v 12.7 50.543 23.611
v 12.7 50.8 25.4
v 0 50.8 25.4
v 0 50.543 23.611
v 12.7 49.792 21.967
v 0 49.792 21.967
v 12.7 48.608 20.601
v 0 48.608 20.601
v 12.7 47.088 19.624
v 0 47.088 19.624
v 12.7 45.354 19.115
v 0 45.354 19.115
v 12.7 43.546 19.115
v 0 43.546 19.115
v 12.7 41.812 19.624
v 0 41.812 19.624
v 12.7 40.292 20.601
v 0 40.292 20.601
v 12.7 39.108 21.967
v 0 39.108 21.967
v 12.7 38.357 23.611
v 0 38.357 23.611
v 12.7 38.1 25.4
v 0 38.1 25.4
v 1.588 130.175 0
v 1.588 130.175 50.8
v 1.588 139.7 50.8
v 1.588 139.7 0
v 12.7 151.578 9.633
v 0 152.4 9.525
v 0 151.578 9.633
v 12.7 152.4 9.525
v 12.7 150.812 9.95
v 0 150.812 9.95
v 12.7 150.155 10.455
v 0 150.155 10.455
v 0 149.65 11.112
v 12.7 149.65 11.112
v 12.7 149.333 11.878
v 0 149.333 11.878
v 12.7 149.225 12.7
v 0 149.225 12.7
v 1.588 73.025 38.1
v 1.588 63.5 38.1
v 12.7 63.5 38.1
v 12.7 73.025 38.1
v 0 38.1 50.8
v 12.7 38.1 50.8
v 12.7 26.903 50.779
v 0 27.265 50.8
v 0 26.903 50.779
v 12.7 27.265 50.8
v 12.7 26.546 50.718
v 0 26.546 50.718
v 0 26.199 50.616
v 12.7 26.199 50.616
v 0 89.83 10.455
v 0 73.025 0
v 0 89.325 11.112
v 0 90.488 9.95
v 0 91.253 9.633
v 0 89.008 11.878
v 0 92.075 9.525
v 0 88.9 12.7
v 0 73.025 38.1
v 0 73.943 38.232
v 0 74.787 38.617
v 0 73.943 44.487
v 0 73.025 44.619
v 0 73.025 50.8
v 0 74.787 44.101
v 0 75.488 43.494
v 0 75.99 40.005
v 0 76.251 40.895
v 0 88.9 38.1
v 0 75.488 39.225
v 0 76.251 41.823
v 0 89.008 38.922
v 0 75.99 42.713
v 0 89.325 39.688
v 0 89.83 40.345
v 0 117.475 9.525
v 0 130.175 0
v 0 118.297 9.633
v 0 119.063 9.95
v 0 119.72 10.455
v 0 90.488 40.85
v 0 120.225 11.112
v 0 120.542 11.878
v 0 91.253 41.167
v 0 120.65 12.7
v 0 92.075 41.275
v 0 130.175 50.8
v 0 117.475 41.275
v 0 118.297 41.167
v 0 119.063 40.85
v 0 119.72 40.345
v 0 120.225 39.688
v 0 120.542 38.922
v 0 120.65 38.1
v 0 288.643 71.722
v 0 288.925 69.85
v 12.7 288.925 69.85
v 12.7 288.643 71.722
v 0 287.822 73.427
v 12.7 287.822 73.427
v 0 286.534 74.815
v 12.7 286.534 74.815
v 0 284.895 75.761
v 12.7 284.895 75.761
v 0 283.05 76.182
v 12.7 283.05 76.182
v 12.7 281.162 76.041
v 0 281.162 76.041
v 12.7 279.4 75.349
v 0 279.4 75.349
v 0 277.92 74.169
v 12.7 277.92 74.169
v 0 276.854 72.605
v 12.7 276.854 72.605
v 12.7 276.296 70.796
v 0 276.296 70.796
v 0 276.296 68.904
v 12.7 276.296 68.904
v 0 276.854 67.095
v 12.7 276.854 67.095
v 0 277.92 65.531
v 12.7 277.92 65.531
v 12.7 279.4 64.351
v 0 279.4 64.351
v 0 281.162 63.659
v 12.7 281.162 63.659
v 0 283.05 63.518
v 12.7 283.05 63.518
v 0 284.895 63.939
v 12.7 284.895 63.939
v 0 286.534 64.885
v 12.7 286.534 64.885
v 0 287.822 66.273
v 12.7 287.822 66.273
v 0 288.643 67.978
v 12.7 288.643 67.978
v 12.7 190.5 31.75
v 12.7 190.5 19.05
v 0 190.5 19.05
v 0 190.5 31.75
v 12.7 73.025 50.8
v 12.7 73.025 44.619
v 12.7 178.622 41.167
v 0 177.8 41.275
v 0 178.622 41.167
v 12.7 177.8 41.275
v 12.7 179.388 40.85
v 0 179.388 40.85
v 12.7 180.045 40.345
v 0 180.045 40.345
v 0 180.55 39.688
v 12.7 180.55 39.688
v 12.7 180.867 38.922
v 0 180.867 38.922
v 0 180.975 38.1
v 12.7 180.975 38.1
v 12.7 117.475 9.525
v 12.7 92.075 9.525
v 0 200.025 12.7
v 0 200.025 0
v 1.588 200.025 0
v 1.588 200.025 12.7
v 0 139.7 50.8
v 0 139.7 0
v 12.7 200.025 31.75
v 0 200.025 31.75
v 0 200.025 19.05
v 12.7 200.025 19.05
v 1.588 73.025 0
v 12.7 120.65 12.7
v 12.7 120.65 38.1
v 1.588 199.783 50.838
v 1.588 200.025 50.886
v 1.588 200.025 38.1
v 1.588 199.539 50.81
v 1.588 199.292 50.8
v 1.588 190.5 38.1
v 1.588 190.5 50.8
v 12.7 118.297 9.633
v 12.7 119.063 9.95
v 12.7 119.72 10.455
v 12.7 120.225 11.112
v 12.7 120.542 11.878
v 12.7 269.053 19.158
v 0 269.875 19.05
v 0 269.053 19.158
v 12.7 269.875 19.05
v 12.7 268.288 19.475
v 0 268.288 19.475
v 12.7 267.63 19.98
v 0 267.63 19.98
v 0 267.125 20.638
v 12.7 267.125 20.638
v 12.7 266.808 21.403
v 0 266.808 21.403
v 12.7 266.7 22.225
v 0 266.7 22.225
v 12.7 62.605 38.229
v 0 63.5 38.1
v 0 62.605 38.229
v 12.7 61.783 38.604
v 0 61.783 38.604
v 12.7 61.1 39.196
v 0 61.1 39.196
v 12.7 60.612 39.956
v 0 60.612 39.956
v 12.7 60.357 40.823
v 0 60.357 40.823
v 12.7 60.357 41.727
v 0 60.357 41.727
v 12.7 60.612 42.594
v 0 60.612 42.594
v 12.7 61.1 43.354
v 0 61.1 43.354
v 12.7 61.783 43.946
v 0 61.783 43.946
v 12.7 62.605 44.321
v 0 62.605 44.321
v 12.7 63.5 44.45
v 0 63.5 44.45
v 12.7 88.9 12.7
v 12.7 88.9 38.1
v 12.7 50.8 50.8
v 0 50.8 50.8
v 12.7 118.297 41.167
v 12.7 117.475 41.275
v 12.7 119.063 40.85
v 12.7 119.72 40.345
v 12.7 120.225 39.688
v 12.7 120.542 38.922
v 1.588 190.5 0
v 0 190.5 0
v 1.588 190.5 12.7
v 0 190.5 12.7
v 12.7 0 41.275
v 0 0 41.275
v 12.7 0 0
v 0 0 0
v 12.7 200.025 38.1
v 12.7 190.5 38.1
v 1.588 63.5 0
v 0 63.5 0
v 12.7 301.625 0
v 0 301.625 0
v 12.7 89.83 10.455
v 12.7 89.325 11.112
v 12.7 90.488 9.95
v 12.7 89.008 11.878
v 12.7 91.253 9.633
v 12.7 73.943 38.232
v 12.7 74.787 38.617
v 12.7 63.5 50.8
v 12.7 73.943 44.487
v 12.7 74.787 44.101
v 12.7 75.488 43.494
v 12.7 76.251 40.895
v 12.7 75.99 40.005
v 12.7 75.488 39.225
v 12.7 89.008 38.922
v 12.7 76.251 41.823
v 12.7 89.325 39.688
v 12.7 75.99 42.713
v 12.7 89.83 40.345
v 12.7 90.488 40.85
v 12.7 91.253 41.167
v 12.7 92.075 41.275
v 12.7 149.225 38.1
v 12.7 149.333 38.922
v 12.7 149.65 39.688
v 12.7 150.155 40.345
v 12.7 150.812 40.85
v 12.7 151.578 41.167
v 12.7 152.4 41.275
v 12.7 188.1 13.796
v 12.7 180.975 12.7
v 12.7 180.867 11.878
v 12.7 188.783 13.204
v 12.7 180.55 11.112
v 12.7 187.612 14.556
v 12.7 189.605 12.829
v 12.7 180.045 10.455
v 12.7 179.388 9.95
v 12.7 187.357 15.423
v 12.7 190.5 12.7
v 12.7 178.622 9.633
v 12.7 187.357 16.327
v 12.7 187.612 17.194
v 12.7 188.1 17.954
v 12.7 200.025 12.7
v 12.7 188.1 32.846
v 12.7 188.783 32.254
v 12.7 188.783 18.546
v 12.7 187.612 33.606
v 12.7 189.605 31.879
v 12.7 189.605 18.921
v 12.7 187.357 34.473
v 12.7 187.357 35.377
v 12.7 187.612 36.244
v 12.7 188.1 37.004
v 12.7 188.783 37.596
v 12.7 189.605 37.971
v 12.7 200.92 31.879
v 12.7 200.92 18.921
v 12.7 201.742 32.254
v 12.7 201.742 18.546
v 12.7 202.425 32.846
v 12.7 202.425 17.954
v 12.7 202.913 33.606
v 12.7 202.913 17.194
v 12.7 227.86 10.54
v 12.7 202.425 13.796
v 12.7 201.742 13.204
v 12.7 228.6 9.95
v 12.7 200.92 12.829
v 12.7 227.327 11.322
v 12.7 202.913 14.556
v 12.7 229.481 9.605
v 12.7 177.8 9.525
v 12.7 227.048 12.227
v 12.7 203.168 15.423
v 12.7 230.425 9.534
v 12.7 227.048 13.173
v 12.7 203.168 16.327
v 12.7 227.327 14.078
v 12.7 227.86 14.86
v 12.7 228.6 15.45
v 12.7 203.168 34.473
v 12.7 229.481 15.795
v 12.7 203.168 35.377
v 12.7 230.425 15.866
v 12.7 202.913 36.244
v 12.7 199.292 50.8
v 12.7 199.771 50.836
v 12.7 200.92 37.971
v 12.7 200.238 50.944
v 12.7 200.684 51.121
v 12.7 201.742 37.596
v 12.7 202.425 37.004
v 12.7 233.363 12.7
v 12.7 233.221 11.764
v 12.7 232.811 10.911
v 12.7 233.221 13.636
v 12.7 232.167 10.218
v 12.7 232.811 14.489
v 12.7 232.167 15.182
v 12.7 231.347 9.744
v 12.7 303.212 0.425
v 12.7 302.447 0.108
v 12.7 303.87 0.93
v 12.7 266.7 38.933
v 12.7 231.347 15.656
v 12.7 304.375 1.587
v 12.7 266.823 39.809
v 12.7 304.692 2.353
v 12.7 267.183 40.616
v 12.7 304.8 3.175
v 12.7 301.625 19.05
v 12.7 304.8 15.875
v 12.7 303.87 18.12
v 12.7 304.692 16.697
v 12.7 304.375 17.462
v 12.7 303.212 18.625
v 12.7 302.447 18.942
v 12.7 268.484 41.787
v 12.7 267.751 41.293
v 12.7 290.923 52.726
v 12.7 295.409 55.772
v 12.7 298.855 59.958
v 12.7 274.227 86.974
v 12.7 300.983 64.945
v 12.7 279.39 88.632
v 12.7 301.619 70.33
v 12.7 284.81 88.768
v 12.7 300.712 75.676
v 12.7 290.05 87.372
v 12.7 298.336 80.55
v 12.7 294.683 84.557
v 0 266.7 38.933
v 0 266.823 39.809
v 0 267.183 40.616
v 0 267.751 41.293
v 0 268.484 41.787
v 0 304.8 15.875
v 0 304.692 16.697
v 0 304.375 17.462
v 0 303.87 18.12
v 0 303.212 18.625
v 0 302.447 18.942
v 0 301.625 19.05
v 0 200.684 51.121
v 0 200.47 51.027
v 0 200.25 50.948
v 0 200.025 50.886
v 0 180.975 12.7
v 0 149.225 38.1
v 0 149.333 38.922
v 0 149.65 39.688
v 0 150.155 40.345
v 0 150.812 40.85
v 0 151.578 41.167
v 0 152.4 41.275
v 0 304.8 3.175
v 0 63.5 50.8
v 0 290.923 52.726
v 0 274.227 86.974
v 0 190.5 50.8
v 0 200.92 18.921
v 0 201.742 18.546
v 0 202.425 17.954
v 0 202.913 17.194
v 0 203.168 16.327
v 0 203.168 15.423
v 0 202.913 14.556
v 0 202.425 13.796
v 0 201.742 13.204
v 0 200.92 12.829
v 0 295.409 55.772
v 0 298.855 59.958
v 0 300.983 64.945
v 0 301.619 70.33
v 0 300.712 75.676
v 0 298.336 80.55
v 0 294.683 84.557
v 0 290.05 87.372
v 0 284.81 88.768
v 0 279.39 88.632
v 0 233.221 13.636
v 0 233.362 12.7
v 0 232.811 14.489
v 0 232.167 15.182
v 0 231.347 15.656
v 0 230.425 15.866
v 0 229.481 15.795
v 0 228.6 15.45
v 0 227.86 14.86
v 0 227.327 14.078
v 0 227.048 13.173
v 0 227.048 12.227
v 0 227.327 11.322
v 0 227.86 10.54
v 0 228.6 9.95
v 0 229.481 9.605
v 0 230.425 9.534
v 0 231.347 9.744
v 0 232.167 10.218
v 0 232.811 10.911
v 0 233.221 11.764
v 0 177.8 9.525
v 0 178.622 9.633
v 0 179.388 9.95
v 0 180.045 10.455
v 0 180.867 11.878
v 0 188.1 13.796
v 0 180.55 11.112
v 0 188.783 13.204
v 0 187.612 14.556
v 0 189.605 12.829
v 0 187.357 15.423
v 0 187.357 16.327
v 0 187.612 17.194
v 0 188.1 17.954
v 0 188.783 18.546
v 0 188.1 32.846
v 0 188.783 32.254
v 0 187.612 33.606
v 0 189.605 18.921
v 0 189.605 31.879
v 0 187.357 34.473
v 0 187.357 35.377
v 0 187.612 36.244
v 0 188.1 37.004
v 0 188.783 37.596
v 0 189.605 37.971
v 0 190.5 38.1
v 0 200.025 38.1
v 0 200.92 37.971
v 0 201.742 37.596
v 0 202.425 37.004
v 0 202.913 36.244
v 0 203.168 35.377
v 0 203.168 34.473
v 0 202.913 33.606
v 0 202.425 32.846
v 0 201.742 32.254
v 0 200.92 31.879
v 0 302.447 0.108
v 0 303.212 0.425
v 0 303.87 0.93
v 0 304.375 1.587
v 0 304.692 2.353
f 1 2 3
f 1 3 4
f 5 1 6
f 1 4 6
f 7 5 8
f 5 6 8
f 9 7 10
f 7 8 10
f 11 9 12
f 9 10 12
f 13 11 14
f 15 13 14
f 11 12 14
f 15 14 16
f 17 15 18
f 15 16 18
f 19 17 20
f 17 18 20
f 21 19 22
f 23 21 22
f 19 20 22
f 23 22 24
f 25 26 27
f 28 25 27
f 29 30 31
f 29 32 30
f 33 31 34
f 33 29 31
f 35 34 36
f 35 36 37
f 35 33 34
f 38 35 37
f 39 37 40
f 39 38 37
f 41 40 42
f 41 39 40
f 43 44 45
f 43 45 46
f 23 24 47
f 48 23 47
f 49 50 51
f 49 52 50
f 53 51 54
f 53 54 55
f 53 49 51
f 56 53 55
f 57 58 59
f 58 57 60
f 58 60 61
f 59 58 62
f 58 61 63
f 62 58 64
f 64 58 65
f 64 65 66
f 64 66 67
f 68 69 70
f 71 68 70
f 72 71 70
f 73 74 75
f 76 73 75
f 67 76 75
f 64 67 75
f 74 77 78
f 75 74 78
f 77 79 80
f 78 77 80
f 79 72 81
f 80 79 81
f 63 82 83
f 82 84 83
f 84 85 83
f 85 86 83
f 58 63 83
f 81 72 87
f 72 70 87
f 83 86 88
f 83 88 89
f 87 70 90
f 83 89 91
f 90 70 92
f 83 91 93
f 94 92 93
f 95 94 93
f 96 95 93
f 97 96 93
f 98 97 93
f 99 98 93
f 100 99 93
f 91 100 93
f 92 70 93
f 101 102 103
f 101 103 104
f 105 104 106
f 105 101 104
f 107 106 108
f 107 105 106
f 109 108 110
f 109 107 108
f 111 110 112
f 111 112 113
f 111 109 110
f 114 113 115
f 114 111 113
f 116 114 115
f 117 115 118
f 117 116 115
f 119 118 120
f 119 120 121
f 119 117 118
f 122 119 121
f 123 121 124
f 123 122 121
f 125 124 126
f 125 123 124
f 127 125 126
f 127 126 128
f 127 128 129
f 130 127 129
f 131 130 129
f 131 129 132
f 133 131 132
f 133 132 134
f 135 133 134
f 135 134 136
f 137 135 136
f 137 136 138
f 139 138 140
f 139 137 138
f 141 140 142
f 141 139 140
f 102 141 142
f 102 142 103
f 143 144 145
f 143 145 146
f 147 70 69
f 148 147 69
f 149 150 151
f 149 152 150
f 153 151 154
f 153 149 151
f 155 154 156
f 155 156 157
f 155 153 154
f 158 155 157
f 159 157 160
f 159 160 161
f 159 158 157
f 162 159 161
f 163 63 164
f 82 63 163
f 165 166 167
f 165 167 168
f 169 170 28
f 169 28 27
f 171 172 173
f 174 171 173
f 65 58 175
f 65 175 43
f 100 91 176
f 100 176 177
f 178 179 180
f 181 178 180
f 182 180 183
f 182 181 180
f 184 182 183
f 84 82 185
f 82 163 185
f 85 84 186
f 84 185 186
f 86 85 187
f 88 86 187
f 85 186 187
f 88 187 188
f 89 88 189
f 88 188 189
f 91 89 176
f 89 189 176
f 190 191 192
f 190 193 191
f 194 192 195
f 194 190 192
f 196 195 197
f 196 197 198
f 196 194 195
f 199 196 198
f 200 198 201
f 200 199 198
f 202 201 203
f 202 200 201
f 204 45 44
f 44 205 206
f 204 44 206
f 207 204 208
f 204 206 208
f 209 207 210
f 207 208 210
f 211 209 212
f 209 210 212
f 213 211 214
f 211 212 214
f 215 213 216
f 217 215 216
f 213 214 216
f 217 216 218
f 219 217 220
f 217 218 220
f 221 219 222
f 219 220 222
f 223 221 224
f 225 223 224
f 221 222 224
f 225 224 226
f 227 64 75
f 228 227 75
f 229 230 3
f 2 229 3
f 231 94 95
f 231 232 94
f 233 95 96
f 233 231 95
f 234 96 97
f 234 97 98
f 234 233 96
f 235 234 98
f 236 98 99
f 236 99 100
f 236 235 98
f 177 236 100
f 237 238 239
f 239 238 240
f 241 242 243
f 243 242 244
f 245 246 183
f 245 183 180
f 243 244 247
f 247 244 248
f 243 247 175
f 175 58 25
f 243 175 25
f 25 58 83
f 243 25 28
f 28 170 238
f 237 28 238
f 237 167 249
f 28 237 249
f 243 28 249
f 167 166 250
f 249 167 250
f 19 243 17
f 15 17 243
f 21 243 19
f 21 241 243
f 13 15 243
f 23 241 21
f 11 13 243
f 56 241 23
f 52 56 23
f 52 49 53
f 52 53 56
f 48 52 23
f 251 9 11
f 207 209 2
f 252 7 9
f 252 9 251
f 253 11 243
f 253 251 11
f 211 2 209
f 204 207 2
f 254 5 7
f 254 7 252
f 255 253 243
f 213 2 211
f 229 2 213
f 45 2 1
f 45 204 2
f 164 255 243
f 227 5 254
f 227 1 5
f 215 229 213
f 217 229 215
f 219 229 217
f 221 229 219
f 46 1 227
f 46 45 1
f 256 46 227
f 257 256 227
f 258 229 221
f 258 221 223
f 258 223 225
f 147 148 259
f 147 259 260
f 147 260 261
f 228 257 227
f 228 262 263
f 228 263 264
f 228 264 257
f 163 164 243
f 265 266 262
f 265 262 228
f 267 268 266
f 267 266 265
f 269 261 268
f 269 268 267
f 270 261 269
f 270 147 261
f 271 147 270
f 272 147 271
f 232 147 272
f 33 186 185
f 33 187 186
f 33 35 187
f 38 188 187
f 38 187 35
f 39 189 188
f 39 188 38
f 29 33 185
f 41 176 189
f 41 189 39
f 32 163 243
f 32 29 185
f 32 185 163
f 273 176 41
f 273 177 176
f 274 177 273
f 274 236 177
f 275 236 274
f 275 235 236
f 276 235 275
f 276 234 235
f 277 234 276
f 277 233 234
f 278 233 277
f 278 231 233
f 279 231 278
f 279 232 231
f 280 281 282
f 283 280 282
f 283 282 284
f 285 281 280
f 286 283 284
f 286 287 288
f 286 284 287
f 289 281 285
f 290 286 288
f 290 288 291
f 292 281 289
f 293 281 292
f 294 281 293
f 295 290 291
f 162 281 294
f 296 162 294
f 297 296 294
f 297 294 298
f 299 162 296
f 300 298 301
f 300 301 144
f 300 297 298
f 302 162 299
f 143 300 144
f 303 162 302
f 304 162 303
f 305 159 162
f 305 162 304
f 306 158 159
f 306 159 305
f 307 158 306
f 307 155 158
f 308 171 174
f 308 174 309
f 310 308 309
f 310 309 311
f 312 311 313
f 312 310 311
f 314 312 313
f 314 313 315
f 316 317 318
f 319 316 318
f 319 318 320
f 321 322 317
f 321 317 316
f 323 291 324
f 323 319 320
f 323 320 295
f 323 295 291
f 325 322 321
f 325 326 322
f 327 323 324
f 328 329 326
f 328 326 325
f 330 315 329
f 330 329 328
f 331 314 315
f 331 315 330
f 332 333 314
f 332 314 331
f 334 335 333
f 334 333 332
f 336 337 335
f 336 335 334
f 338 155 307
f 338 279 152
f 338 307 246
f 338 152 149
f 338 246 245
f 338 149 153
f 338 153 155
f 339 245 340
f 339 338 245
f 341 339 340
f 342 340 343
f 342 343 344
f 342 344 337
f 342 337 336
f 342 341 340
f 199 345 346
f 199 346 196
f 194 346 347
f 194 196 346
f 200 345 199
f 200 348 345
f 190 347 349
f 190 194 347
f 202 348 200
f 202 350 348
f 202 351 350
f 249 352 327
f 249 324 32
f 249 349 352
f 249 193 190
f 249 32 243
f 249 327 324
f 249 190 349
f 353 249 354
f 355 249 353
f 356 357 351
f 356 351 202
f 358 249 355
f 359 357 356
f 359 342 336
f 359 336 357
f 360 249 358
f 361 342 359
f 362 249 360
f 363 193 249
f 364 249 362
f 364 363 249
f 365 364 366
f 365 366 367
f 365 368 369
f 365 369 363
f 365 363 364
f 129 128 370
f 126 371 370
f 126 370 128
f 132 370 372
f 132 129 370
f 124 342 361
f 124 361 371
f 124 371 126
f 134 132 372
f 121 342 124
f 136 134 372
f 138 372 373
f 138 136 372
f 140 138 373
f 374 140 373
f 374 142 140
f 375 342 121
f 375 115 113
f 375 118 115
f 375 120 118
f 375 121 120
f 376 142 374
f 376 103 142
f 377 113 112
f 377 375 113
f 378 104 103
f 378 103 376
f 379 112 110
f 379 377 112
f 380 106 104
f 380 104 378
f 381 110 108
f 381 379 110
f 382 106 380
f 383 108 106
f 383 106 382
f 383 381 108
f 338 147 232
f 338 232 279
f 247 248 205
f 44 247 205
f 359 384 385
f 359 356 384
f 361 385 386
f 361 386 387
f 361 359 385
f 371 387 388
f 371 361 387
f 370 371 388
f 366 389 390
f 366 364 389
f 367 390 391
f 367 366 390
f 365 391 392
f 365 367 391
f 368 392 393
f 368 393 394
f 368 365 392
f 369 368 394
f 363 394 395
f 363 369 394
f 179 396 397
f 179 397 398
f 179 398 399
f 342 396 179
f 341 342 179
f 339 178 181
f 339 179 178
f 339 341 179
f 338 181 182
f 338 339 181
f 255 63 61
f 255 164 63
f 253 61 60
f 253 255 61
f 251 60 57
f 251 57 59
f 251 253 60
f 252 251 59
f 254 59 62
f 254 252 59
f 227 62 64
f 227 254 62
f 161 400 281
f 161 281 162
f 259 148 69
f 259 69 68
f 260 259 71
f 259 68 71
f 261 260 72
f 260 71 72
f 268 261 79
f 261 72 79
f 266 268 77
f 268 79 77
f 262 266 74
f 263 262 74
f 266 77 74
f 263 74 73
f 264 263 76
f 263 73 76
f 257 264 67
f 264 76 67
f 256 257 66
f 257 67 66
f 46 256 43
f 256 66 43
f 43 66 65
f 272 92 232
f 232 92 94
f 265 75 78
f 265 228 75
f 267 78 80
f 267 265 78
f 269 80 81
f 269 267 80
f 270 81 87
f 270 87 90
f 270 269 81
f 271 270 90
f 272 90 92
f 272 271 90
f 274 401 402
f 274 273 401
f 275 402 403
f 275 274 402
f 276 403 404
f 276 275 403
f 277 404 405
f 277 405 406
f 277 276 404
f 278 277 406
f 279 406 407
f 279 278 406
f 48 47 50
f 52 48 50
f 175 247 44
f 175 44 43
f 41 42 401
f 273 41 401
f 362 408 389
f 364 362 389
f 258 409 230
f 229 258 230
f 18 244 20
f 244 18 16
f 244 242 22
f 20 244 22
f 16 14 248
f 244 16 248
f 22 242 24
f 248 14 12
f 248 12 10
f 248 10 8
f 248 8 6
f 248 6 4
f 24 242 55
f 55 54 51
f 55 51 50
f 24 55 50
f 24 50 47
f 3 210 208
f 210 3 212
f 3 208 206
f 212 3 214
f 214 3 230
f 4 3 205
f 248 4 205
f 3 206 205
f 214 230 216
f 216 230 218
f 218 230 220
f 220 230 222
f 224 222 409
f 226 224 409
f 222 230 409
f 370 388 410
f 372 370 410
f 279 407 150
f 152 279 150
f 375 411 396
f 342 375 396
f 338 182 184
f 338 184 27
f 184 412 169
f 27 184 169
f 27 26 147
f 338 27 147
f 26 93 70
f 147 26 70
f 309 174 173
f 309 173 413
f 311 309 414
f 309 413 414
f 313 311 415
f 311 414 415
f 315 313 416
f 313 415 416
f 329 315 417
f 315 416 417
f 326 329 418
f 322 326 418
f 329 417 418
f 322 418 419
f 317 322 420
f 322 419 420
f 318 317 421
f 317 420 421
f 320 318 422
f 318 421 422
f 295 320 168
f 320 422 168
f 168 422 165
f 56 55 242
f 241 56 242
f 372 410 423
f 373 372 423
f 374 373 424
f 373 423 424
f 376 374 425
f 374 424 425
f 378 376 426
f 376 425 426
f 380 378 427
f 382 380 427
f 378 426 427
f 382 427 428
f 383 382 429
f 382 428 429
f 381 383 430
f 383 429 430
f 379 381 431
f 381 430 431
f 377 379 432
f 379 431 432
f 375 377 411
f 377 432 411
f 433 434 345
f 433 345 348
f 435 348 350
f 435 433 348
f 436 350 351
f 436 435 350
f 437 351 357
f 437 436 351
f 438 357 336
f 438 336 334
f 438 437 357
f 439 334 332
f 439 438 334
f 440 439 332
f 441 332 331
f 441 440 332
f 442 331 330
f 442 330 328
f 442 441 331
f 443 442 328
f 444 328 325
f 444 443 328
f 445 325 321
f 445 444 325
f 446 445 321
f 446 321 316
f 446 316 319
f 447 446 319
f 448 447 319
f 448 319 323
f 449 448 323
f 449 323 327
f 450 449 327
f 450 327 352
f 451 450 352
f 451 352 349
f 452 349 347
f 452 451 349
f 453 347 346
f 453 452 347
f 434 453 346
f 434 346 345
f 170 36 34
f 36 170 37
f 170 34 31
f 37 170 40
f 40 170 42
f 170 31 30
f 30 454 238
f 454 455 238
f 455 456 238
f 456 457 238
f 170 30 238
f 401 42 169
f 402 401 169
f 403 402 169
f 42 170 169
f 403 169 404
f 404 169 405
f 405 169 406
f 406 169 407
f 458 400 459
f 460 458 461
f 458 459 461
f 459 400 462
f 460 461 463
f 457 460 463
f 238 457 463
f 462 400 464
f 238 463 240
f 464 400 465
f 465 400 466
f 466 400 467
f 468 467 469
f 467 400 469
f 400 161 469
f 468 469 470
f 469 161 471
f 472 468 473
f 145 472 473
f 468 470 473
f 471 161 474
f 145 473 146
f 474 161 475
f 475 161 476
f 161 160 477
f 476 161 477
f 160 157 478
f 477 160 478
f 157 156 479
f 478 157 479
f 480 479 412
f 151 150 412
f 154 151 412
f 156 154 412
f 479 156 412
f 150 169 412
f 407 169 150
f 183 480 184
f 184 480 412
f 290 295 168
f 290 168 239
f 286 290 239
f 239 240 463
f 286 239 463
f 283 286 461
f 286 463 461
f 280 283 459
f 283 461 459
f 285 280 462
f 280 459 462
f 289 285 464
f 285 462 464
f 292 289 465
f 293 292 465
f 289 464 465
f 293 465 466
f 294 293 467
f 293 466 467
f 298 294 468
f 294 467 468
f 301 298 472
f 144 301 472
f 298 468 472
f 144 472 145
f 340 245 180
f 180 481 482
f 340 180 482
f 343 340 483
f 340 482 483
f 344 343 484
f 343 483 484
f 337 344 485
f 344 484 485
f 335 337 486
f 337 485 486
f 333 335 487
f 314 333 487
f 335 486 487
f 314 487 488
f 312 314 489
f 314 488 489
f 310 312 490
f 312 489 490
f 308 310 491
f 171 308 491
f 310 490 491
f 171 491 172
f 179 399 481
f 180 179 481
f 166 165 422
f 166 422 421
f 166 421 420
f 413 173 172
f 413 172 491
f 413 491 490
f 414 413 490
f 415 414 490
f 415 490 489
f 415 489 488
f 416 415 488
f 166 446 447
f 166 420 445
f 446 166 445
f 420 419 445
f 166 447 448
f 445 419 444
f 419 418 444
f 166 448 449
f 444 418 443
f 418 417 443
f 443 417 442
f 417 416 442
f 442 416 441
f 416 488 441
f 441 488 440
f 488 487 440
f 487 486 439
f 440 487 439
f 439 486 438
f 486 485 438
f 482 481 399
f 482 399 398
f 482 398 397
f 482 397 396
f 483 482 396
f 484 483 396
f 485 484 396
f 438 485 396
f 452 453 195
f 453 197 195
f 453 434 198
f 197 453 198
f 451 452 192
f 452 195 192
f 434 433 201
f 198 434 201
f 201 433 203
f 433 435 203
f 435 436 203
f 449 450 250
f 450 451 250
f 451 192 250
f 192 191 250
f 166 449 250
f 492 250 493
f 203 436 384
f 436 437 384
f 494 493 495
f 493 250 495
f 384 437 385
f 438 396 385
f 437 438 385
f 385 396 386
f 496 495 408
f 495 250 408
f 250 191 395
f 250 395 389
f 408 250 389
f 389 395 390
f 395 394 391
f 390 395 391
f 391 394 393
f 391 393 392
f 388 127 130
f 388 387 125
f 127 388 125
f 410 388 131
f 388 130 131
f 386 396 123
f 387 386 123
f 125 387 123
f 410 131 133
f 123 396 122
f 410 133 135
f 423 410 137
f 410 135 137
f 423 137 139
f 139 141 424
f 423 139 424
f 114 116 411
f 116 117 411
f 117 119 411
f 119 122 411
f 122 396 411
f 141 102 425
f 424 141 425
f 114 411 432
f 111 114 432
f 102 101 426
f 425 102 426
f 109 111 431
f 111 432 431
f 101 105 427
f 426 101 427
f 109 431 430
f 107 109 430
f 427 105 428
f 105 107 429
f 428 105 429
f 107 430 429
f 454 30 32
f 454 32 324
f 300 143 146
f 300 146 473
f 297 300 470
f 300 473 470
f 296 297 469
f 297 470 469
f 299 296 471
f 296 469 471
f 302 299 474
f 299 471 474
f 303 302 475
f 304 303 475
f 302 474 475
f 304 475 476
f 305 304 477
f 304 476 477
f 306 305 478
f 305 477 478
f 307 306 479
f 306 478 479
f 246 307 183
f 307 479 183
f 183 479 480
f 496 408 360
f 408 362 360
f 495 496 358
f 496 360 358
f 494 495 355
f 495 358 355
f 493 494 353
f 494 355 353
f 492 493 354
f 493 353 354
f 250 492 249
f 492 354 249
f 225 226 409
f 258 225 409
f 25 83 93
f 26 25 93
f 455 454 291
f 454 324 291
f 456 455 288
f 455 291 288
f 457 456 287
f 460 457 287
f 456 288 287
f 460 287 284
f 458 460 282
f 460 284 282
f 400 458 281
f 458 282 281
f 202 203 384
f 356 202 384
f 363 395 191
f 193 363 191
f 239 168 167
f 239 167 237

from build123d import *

# Parameters (mm, degrees)
F0_W         = 9.525
F0_H         = 50.8
F0_R         = 3.175
F0_W_2       = 31.75
F0_H_2       = 31.75
F0_R_2       = 6.35
F0_H_3       = 38.1
F1_DEPTH     = 12.7
F2_R         = 3.175
F3_W         = 9.525
F3_H         = 12.7
F1_FACE1_R   = 6.35
F1_FACE1_R_2 = 3.175
F4_DEPTH     = 1.5875
F5_DEPTH     = 1.5875
F6_DEPTH     = 1.5875


with BuildPart() as f1:
    # F0 (on Right) → F1 (new body)
    with BuildSketch(Plane.YZ):
        with Locations((134.9375, 25.4)):
            Rectangle(F0_W, F0_H)
        with BuildLine():
            Line((139.7, 50.8), (139.7, 0))
            Line((139.7, 0), (304.8, 0))
            Line((304.8, 0), (304.8, 19.05))
            Line((304.8, 19.05), (266.7, 19.05))
            Line((266.7, 19.05), (266.7, 40.9178125))
            Line((266.7, 40.9178125), (290.922752809, 52.7264044944))
            ThreePointArc((290.922752809, 52.7264044944), (299.6985955056, 78.197752809), (274.227247191, 86.9735955056))
            Line((274.227247191, 86.9735955056), (200.025, 50.8))
            Line((200.025, 50.8), (139.7, 50.8))
        make_face()
        with Locations((230.1875, 12.7)):
            Circle(F0_R, mode=Mode.SUBTRACT)
        with Locations((165.1, 25.4)):
            Rectangle(F0_W_2, F0_H_2, mode=Mode.SUBTRACT)
        with BuildLine():
            Line((190.5, 38.1), (200.025, 38.1))
            ThreePointArc((200.025, 38.1), (203.2, 34.925), (200.025, 31.75))
            Line((200.025, 31.75), (200.025, 19.05))
            ThreePointArc((200.025, 19.05), (203.2, 15.875), (200.025, 12.7))
            Line((200.025, 12.7), (190.5, 12.7))
            ThreePointArc((190.5, 12.7), (187.325, 15.875), (190.5, 19.05))
            Line((190.5, 19.05), (190.5, 31.75))
            ThreePointArc((190.5, 31.75), (187.325, 34.925), (190.5, 38.1))
        make_face(mode=Mode.SUBTRACT)
        with Locations((282.575, 69.85)):
            Circle(F0_R_2, mode=Mode.SUBTRACT)
        with BuildLine():
            Line((73.025, 38.1), (73.025, 0))
            Line((73.025, 0), (130.175, 0))
            Line((130.175, 0), (130.175, 50.8))
            Line((130.175, 50.8), (73.025, 50.8))
            Line((73.025, 50.8), (73.025, 44.6185247588))
            ThreePointArc((73.025, 44.6185247588), (76.2842623794, 41.3592623794), (73.025, 38.1))
        make_face()
        with Locations((104.775, 25.4)):
            Rectangle(F0_W_2, F0_H_2, mode=Mode.SUBTRACT)
        with Locations((68.2625, 19.05)):
            Rectangle(F0_W, F0_H_3)
        with BuildLine():
            Line((0, 41.275), (0, 0))
            Line((0, 0), (63.5, 0))
            Line((63.5, 0), (63.5, 38.1))
            ThreePointArc((63.5, 38.1), (60.325, 41.275), (63.5, 44.45))
            Line((63.5, 44.45), (63.5, 50.8))
            Line((63.5, 50.8), (50.8, 50.8))
            Line((50.8, 50.8), (50.8, 25.4))
            ThreePointArc((50.8, 25.4), (44.45, 19.05), (38.1, 25.4))
            Line((38.1, 25.4), (38.1, 50.8))
            Line((38.1, 50.8), (26.7157145118, 50.8))
            Line((26.7157145118, 50.8), (0, 41.275))
        make_face()
    extrude(amount=F1_DEPTH)

    # F2
    f2_edges = [f1.edges().sort_by_distance(p)[0] for p in [
        (6.35, 200.025, 50.8),
        (6.35, 266.7, 40.917813),
        (6.35, 266.7, 19.05),
        (6.35, 304.8, 19.05),
        (6.35, 304.8, 0),
        (6.35, 149.225, 41.275),
        (6.35, 88.9, 41.275),
        (6.35, 180.975, 9.525),
        (6.35, 180.975, 41.275),
        (6.35, 120.65, 41.275),
        (6.35, 149.225, 9.525),
        (6.35, 88.9, 9.525),
        (6.35, 120.65, 9.525),
        (6.35, 26.715715, 50.8),
    ]]
    fillet(f2_edges, radius=F2_R)

    # F3 (on face) + F1_face1 (on face) → F4 (cut)
    with BuildSketch(Plane(origin=(0, 0, 0), x_dir=(0, -1, 0), z_dir=(-1, 0, 0))):
        with Locations((-195.2625, 6.35)):
            Rectangle(F3_W, F3_H)
        with BuildLine():
            Line((-190.5, 38.1), (-190.5, 50.8))
            Line((-190.5, 50.8), (-199.2923076923, 50.8))
            ThreePointArc((-199.2923076923, 50.8), (-199.6611512097, 50.8214972713), (-200.025, 50.8856979781))
            Line((-200.025, 50.8856979781), (-200.025, 38.1))
            Line((-200.025, 38.1), (-190.5, 38.1))
        make_face()
    with BuildSketch(Plane(origin=(12.7, 165.3857306848, 30.2558551576), x_dir=(0, 1, 0), z_dir=(1, 0, 0))):
        with BuildLine():
            Line((139.4142693152, -27.0808551576), (139.4142693152, -14.3808551576))
            ThreePointArc((139.4142693152, -14.3808551576), (138.4843333455, -12.1357911273), (136.2392693152, -11.2058551576))
            Line((136.2392693152, -11.2058551576), (104.4892693152, -11.2058551576))
            ThreePointArc((104.4892693152, -11.2058551576), (102.2442052849, -10.2759191878), (101.3142693152, -8.0308551576))
            Line((101.3142693152, -8.0308551576), (101.3142693152, 8.6775823424))
            ThreePointArc((101.3142693152, 8.6775823424), (101.7968747, 10.3603289769), (103.0979771804, 11.5315149267))
            Line((103.0979771804, 11.5315149267), (125.5370221242, 22.4705493368))
            ThreePointArc((125.5370221242, 22.4705493368), (134.3128648208, 47.9418976514), (108.8415165062, 56.717740348))
            Line((108.8415165062, 56.717740348), (35.2978691423, 20.8652122582))
            ThreePointArc((35.2978691423, 20.8652122582), (34.6205059413, 20.6254527961), (33.9065770075, 20.5441448424))
            Line((33.9065770075, 20.5441448424), (-92.3607306848, 20.5441448424))
            Line((-92.3607306848, 20.5441448424), (-92.3607306848, 14.3626696012))
            ThreePointArc((-92.3607306848, 14.3626696012), (-89.1014683054, 11.1034072218), (-92.3607306848, 7.8441448424))
            Line((-92.3607306848, 7.8441448424), (-101.8857306848, 7.8441448424))
            ThreePointArc((-101.8857306848, 7.8441448424), (-105.0607306848, 11.0191448424), (-101.8857306848, 14.1941448424))
            Line((-101.8857306848, 14.1941448424), (-101.8857306848, 20.5441448424))
            Line((-101.8857306848, 20.5441448424), (-114.5857306848, 20.5441448424))
            Line((-114.5857306848, 20.5441448424), (-114.5857306848, -4.8558551576))
            ThreePointArc((-114.5857306848, -4.8558551576), (-120.9357306848, -11.2058551576), (-127.2857306848, -4.8558551576))
            Line((-127.2857306848, -4.8558551576), (-127.2857306848, 20.5441448424))
            Line((-127.2857306848, 20.5441448424), (-138.120948876, 20.5441448424))
            ThreePointArc((-138.120948876, 20.5441448424), (-138.661985551, 20.4977075022), (-139.1871958927, 20.3597538606))
            Line((-139.1871958927, 20.3597538606), (-165.3857306848, 11.0191448424))
            Line((-165.3857306848, 11.0191448424), (-165.3857306848, -30.2558551576))
            Line((-165.3857306848, -30.2558551576), (136.2392693152, -30.2558551576))
            ThreePointArc((136.2392693152, -30.2558551576), (138.4843333455, -29.3259191878), (139.4142693152, -27.0808551576))
        make_face()
        with Locations((117.1892693152, 39.5941448424)):
            Circle(F1_FACE1_R, mode=Mode.SUBTRACT)
        with Locations((64.8017693152, -17.5558551576)):
            Circle(F1_FACE1_R_2, mode=Mode.SUBTRACT)
        with BuildLine():
            Line((34.6392693152, -17.5558551576), (25.1142693152, -17.5558551576))
            ThreePointArc((25.1142693152, -17.5558551576), (21.9392693152, -14.3808551576), (25.1142693152, -11.2058551576))
            Line((25.1142693152, -11.2058551576), (25.1142693152, 1.4941448424))
            ThreePointArc((25.1142693152, 1.4941448424), (21.9392693152, 4.6691448424), (25.1142693152, 7.8441448424))
            Line((25.1142693152, 7.8441448424), (34.6392693152, 7.8441448424))
            ThreePointArc((34.6392693152, 7.8441448424), (37.8142693152, 4.6691448424), (34.6392693152, 1.4941448424))
            Line((34.6392693152, 1.4941448424), (34.6392693152, -11.2058551576))
            ThreePointArc((34.6392693152, -11.2058551576), (37.8142693152, -14.3808551576), (34.6392693152, -17.5558551576))
        make_face(mode=Mode.SUBTRACT)
        with BuildLine():
            Line((-16.1607306848, -17.5558551576), (-16.1607306848, 7.8441448424))
            ThreePointArc((-16.1607306848, 7.8441448424), (-15.2307947151, 10.0892088727), (-12.9857306848, 11.0191448424))
            Line((-12.9857306848, 11.0191448424), (12.4142693152, 11.0191448424))
            ThreePointArc((12.4142693152, 11.0191448424), (14.6593333455, 10.0892088727), (15.5892693152, 7.8441448424))
            Line((15.5892693152, 7.8441448424), (15.5892693152, -17.5558551576))
            ThreePointArc((15.5892693152, -17.5558551576), (14.6593333455, -19.8009191878), (12.4142693152, -20.7308551576))
            Line((12.4142693152, -20.7308551576), (-12.9857306848, -20.7308551576))
            ThreePointArc((-12.9857306848, -20.7308551576), (-15.2307947151, -19.8009191878), (-16.1607306848, -17.5558551576))
        make_face(mode=Mode.SUBTRACT)
        with BuildLine():
            Line((-47.9107306848, -20.7308551576), (-73.3107306848, -20.7308551576))
            ThreePointArc((-73.3107306848, -20.7308551576), (-75.5557947151, -19.8009191878), (-76.4857306848, -17.5558551576))
            Line((-76.4857306848, -17.5558551576), (-76.4857306848, 7.8441448424))
            ThreePointArc((-76.4857306848, 7.8441448424), (-75.5557947151, 10.0892088727), (-73.3107306848, 11.0191448424))
            Line((-73.3107306848, 11.0191448424), (-47.9107306848, 11.0191448424))
            ThreePointArc((-47.9107306848, 11.0191448424), (-45.6656666545, 10.0892088727), (-44.7357306848, 7.8441448424))
            Line((-44.7357306848, 7.8441448424), (-44.7357306848, -17.5558551576))
            ThreePointArc((-44.7357306848, -17.5558551576), (-45.6656666545, -19.8009191878), (-47.9107306848, -20.7308551576))
        make_face(mode=Mode.SUBTRACT)
    extrude(amount=-F4_DEPTH, dir=(-1, 0, 0), mode=Mode.SUBTRACT)

    # F0 (on Right) → F5 (cut)
    with BuildSketch(Plane.YZ):
        with Locations((134.9375, 25.4)):
            Rectangle(F0_W, F0_H)
    extrude(amount=F5_DEPTH, mode=Mode.SUBTRACT)

    # F0 (on Right) → F6 (cut)
    with BuildSketch(Plane.YZ):
        with Locations((68.2625, 19.05)):
            Rectangle(F0_W, F0_H_3)
    extrude(amount=F6_DEPTH, mode=Mode.SUBTRACT)


solid = f1.part
